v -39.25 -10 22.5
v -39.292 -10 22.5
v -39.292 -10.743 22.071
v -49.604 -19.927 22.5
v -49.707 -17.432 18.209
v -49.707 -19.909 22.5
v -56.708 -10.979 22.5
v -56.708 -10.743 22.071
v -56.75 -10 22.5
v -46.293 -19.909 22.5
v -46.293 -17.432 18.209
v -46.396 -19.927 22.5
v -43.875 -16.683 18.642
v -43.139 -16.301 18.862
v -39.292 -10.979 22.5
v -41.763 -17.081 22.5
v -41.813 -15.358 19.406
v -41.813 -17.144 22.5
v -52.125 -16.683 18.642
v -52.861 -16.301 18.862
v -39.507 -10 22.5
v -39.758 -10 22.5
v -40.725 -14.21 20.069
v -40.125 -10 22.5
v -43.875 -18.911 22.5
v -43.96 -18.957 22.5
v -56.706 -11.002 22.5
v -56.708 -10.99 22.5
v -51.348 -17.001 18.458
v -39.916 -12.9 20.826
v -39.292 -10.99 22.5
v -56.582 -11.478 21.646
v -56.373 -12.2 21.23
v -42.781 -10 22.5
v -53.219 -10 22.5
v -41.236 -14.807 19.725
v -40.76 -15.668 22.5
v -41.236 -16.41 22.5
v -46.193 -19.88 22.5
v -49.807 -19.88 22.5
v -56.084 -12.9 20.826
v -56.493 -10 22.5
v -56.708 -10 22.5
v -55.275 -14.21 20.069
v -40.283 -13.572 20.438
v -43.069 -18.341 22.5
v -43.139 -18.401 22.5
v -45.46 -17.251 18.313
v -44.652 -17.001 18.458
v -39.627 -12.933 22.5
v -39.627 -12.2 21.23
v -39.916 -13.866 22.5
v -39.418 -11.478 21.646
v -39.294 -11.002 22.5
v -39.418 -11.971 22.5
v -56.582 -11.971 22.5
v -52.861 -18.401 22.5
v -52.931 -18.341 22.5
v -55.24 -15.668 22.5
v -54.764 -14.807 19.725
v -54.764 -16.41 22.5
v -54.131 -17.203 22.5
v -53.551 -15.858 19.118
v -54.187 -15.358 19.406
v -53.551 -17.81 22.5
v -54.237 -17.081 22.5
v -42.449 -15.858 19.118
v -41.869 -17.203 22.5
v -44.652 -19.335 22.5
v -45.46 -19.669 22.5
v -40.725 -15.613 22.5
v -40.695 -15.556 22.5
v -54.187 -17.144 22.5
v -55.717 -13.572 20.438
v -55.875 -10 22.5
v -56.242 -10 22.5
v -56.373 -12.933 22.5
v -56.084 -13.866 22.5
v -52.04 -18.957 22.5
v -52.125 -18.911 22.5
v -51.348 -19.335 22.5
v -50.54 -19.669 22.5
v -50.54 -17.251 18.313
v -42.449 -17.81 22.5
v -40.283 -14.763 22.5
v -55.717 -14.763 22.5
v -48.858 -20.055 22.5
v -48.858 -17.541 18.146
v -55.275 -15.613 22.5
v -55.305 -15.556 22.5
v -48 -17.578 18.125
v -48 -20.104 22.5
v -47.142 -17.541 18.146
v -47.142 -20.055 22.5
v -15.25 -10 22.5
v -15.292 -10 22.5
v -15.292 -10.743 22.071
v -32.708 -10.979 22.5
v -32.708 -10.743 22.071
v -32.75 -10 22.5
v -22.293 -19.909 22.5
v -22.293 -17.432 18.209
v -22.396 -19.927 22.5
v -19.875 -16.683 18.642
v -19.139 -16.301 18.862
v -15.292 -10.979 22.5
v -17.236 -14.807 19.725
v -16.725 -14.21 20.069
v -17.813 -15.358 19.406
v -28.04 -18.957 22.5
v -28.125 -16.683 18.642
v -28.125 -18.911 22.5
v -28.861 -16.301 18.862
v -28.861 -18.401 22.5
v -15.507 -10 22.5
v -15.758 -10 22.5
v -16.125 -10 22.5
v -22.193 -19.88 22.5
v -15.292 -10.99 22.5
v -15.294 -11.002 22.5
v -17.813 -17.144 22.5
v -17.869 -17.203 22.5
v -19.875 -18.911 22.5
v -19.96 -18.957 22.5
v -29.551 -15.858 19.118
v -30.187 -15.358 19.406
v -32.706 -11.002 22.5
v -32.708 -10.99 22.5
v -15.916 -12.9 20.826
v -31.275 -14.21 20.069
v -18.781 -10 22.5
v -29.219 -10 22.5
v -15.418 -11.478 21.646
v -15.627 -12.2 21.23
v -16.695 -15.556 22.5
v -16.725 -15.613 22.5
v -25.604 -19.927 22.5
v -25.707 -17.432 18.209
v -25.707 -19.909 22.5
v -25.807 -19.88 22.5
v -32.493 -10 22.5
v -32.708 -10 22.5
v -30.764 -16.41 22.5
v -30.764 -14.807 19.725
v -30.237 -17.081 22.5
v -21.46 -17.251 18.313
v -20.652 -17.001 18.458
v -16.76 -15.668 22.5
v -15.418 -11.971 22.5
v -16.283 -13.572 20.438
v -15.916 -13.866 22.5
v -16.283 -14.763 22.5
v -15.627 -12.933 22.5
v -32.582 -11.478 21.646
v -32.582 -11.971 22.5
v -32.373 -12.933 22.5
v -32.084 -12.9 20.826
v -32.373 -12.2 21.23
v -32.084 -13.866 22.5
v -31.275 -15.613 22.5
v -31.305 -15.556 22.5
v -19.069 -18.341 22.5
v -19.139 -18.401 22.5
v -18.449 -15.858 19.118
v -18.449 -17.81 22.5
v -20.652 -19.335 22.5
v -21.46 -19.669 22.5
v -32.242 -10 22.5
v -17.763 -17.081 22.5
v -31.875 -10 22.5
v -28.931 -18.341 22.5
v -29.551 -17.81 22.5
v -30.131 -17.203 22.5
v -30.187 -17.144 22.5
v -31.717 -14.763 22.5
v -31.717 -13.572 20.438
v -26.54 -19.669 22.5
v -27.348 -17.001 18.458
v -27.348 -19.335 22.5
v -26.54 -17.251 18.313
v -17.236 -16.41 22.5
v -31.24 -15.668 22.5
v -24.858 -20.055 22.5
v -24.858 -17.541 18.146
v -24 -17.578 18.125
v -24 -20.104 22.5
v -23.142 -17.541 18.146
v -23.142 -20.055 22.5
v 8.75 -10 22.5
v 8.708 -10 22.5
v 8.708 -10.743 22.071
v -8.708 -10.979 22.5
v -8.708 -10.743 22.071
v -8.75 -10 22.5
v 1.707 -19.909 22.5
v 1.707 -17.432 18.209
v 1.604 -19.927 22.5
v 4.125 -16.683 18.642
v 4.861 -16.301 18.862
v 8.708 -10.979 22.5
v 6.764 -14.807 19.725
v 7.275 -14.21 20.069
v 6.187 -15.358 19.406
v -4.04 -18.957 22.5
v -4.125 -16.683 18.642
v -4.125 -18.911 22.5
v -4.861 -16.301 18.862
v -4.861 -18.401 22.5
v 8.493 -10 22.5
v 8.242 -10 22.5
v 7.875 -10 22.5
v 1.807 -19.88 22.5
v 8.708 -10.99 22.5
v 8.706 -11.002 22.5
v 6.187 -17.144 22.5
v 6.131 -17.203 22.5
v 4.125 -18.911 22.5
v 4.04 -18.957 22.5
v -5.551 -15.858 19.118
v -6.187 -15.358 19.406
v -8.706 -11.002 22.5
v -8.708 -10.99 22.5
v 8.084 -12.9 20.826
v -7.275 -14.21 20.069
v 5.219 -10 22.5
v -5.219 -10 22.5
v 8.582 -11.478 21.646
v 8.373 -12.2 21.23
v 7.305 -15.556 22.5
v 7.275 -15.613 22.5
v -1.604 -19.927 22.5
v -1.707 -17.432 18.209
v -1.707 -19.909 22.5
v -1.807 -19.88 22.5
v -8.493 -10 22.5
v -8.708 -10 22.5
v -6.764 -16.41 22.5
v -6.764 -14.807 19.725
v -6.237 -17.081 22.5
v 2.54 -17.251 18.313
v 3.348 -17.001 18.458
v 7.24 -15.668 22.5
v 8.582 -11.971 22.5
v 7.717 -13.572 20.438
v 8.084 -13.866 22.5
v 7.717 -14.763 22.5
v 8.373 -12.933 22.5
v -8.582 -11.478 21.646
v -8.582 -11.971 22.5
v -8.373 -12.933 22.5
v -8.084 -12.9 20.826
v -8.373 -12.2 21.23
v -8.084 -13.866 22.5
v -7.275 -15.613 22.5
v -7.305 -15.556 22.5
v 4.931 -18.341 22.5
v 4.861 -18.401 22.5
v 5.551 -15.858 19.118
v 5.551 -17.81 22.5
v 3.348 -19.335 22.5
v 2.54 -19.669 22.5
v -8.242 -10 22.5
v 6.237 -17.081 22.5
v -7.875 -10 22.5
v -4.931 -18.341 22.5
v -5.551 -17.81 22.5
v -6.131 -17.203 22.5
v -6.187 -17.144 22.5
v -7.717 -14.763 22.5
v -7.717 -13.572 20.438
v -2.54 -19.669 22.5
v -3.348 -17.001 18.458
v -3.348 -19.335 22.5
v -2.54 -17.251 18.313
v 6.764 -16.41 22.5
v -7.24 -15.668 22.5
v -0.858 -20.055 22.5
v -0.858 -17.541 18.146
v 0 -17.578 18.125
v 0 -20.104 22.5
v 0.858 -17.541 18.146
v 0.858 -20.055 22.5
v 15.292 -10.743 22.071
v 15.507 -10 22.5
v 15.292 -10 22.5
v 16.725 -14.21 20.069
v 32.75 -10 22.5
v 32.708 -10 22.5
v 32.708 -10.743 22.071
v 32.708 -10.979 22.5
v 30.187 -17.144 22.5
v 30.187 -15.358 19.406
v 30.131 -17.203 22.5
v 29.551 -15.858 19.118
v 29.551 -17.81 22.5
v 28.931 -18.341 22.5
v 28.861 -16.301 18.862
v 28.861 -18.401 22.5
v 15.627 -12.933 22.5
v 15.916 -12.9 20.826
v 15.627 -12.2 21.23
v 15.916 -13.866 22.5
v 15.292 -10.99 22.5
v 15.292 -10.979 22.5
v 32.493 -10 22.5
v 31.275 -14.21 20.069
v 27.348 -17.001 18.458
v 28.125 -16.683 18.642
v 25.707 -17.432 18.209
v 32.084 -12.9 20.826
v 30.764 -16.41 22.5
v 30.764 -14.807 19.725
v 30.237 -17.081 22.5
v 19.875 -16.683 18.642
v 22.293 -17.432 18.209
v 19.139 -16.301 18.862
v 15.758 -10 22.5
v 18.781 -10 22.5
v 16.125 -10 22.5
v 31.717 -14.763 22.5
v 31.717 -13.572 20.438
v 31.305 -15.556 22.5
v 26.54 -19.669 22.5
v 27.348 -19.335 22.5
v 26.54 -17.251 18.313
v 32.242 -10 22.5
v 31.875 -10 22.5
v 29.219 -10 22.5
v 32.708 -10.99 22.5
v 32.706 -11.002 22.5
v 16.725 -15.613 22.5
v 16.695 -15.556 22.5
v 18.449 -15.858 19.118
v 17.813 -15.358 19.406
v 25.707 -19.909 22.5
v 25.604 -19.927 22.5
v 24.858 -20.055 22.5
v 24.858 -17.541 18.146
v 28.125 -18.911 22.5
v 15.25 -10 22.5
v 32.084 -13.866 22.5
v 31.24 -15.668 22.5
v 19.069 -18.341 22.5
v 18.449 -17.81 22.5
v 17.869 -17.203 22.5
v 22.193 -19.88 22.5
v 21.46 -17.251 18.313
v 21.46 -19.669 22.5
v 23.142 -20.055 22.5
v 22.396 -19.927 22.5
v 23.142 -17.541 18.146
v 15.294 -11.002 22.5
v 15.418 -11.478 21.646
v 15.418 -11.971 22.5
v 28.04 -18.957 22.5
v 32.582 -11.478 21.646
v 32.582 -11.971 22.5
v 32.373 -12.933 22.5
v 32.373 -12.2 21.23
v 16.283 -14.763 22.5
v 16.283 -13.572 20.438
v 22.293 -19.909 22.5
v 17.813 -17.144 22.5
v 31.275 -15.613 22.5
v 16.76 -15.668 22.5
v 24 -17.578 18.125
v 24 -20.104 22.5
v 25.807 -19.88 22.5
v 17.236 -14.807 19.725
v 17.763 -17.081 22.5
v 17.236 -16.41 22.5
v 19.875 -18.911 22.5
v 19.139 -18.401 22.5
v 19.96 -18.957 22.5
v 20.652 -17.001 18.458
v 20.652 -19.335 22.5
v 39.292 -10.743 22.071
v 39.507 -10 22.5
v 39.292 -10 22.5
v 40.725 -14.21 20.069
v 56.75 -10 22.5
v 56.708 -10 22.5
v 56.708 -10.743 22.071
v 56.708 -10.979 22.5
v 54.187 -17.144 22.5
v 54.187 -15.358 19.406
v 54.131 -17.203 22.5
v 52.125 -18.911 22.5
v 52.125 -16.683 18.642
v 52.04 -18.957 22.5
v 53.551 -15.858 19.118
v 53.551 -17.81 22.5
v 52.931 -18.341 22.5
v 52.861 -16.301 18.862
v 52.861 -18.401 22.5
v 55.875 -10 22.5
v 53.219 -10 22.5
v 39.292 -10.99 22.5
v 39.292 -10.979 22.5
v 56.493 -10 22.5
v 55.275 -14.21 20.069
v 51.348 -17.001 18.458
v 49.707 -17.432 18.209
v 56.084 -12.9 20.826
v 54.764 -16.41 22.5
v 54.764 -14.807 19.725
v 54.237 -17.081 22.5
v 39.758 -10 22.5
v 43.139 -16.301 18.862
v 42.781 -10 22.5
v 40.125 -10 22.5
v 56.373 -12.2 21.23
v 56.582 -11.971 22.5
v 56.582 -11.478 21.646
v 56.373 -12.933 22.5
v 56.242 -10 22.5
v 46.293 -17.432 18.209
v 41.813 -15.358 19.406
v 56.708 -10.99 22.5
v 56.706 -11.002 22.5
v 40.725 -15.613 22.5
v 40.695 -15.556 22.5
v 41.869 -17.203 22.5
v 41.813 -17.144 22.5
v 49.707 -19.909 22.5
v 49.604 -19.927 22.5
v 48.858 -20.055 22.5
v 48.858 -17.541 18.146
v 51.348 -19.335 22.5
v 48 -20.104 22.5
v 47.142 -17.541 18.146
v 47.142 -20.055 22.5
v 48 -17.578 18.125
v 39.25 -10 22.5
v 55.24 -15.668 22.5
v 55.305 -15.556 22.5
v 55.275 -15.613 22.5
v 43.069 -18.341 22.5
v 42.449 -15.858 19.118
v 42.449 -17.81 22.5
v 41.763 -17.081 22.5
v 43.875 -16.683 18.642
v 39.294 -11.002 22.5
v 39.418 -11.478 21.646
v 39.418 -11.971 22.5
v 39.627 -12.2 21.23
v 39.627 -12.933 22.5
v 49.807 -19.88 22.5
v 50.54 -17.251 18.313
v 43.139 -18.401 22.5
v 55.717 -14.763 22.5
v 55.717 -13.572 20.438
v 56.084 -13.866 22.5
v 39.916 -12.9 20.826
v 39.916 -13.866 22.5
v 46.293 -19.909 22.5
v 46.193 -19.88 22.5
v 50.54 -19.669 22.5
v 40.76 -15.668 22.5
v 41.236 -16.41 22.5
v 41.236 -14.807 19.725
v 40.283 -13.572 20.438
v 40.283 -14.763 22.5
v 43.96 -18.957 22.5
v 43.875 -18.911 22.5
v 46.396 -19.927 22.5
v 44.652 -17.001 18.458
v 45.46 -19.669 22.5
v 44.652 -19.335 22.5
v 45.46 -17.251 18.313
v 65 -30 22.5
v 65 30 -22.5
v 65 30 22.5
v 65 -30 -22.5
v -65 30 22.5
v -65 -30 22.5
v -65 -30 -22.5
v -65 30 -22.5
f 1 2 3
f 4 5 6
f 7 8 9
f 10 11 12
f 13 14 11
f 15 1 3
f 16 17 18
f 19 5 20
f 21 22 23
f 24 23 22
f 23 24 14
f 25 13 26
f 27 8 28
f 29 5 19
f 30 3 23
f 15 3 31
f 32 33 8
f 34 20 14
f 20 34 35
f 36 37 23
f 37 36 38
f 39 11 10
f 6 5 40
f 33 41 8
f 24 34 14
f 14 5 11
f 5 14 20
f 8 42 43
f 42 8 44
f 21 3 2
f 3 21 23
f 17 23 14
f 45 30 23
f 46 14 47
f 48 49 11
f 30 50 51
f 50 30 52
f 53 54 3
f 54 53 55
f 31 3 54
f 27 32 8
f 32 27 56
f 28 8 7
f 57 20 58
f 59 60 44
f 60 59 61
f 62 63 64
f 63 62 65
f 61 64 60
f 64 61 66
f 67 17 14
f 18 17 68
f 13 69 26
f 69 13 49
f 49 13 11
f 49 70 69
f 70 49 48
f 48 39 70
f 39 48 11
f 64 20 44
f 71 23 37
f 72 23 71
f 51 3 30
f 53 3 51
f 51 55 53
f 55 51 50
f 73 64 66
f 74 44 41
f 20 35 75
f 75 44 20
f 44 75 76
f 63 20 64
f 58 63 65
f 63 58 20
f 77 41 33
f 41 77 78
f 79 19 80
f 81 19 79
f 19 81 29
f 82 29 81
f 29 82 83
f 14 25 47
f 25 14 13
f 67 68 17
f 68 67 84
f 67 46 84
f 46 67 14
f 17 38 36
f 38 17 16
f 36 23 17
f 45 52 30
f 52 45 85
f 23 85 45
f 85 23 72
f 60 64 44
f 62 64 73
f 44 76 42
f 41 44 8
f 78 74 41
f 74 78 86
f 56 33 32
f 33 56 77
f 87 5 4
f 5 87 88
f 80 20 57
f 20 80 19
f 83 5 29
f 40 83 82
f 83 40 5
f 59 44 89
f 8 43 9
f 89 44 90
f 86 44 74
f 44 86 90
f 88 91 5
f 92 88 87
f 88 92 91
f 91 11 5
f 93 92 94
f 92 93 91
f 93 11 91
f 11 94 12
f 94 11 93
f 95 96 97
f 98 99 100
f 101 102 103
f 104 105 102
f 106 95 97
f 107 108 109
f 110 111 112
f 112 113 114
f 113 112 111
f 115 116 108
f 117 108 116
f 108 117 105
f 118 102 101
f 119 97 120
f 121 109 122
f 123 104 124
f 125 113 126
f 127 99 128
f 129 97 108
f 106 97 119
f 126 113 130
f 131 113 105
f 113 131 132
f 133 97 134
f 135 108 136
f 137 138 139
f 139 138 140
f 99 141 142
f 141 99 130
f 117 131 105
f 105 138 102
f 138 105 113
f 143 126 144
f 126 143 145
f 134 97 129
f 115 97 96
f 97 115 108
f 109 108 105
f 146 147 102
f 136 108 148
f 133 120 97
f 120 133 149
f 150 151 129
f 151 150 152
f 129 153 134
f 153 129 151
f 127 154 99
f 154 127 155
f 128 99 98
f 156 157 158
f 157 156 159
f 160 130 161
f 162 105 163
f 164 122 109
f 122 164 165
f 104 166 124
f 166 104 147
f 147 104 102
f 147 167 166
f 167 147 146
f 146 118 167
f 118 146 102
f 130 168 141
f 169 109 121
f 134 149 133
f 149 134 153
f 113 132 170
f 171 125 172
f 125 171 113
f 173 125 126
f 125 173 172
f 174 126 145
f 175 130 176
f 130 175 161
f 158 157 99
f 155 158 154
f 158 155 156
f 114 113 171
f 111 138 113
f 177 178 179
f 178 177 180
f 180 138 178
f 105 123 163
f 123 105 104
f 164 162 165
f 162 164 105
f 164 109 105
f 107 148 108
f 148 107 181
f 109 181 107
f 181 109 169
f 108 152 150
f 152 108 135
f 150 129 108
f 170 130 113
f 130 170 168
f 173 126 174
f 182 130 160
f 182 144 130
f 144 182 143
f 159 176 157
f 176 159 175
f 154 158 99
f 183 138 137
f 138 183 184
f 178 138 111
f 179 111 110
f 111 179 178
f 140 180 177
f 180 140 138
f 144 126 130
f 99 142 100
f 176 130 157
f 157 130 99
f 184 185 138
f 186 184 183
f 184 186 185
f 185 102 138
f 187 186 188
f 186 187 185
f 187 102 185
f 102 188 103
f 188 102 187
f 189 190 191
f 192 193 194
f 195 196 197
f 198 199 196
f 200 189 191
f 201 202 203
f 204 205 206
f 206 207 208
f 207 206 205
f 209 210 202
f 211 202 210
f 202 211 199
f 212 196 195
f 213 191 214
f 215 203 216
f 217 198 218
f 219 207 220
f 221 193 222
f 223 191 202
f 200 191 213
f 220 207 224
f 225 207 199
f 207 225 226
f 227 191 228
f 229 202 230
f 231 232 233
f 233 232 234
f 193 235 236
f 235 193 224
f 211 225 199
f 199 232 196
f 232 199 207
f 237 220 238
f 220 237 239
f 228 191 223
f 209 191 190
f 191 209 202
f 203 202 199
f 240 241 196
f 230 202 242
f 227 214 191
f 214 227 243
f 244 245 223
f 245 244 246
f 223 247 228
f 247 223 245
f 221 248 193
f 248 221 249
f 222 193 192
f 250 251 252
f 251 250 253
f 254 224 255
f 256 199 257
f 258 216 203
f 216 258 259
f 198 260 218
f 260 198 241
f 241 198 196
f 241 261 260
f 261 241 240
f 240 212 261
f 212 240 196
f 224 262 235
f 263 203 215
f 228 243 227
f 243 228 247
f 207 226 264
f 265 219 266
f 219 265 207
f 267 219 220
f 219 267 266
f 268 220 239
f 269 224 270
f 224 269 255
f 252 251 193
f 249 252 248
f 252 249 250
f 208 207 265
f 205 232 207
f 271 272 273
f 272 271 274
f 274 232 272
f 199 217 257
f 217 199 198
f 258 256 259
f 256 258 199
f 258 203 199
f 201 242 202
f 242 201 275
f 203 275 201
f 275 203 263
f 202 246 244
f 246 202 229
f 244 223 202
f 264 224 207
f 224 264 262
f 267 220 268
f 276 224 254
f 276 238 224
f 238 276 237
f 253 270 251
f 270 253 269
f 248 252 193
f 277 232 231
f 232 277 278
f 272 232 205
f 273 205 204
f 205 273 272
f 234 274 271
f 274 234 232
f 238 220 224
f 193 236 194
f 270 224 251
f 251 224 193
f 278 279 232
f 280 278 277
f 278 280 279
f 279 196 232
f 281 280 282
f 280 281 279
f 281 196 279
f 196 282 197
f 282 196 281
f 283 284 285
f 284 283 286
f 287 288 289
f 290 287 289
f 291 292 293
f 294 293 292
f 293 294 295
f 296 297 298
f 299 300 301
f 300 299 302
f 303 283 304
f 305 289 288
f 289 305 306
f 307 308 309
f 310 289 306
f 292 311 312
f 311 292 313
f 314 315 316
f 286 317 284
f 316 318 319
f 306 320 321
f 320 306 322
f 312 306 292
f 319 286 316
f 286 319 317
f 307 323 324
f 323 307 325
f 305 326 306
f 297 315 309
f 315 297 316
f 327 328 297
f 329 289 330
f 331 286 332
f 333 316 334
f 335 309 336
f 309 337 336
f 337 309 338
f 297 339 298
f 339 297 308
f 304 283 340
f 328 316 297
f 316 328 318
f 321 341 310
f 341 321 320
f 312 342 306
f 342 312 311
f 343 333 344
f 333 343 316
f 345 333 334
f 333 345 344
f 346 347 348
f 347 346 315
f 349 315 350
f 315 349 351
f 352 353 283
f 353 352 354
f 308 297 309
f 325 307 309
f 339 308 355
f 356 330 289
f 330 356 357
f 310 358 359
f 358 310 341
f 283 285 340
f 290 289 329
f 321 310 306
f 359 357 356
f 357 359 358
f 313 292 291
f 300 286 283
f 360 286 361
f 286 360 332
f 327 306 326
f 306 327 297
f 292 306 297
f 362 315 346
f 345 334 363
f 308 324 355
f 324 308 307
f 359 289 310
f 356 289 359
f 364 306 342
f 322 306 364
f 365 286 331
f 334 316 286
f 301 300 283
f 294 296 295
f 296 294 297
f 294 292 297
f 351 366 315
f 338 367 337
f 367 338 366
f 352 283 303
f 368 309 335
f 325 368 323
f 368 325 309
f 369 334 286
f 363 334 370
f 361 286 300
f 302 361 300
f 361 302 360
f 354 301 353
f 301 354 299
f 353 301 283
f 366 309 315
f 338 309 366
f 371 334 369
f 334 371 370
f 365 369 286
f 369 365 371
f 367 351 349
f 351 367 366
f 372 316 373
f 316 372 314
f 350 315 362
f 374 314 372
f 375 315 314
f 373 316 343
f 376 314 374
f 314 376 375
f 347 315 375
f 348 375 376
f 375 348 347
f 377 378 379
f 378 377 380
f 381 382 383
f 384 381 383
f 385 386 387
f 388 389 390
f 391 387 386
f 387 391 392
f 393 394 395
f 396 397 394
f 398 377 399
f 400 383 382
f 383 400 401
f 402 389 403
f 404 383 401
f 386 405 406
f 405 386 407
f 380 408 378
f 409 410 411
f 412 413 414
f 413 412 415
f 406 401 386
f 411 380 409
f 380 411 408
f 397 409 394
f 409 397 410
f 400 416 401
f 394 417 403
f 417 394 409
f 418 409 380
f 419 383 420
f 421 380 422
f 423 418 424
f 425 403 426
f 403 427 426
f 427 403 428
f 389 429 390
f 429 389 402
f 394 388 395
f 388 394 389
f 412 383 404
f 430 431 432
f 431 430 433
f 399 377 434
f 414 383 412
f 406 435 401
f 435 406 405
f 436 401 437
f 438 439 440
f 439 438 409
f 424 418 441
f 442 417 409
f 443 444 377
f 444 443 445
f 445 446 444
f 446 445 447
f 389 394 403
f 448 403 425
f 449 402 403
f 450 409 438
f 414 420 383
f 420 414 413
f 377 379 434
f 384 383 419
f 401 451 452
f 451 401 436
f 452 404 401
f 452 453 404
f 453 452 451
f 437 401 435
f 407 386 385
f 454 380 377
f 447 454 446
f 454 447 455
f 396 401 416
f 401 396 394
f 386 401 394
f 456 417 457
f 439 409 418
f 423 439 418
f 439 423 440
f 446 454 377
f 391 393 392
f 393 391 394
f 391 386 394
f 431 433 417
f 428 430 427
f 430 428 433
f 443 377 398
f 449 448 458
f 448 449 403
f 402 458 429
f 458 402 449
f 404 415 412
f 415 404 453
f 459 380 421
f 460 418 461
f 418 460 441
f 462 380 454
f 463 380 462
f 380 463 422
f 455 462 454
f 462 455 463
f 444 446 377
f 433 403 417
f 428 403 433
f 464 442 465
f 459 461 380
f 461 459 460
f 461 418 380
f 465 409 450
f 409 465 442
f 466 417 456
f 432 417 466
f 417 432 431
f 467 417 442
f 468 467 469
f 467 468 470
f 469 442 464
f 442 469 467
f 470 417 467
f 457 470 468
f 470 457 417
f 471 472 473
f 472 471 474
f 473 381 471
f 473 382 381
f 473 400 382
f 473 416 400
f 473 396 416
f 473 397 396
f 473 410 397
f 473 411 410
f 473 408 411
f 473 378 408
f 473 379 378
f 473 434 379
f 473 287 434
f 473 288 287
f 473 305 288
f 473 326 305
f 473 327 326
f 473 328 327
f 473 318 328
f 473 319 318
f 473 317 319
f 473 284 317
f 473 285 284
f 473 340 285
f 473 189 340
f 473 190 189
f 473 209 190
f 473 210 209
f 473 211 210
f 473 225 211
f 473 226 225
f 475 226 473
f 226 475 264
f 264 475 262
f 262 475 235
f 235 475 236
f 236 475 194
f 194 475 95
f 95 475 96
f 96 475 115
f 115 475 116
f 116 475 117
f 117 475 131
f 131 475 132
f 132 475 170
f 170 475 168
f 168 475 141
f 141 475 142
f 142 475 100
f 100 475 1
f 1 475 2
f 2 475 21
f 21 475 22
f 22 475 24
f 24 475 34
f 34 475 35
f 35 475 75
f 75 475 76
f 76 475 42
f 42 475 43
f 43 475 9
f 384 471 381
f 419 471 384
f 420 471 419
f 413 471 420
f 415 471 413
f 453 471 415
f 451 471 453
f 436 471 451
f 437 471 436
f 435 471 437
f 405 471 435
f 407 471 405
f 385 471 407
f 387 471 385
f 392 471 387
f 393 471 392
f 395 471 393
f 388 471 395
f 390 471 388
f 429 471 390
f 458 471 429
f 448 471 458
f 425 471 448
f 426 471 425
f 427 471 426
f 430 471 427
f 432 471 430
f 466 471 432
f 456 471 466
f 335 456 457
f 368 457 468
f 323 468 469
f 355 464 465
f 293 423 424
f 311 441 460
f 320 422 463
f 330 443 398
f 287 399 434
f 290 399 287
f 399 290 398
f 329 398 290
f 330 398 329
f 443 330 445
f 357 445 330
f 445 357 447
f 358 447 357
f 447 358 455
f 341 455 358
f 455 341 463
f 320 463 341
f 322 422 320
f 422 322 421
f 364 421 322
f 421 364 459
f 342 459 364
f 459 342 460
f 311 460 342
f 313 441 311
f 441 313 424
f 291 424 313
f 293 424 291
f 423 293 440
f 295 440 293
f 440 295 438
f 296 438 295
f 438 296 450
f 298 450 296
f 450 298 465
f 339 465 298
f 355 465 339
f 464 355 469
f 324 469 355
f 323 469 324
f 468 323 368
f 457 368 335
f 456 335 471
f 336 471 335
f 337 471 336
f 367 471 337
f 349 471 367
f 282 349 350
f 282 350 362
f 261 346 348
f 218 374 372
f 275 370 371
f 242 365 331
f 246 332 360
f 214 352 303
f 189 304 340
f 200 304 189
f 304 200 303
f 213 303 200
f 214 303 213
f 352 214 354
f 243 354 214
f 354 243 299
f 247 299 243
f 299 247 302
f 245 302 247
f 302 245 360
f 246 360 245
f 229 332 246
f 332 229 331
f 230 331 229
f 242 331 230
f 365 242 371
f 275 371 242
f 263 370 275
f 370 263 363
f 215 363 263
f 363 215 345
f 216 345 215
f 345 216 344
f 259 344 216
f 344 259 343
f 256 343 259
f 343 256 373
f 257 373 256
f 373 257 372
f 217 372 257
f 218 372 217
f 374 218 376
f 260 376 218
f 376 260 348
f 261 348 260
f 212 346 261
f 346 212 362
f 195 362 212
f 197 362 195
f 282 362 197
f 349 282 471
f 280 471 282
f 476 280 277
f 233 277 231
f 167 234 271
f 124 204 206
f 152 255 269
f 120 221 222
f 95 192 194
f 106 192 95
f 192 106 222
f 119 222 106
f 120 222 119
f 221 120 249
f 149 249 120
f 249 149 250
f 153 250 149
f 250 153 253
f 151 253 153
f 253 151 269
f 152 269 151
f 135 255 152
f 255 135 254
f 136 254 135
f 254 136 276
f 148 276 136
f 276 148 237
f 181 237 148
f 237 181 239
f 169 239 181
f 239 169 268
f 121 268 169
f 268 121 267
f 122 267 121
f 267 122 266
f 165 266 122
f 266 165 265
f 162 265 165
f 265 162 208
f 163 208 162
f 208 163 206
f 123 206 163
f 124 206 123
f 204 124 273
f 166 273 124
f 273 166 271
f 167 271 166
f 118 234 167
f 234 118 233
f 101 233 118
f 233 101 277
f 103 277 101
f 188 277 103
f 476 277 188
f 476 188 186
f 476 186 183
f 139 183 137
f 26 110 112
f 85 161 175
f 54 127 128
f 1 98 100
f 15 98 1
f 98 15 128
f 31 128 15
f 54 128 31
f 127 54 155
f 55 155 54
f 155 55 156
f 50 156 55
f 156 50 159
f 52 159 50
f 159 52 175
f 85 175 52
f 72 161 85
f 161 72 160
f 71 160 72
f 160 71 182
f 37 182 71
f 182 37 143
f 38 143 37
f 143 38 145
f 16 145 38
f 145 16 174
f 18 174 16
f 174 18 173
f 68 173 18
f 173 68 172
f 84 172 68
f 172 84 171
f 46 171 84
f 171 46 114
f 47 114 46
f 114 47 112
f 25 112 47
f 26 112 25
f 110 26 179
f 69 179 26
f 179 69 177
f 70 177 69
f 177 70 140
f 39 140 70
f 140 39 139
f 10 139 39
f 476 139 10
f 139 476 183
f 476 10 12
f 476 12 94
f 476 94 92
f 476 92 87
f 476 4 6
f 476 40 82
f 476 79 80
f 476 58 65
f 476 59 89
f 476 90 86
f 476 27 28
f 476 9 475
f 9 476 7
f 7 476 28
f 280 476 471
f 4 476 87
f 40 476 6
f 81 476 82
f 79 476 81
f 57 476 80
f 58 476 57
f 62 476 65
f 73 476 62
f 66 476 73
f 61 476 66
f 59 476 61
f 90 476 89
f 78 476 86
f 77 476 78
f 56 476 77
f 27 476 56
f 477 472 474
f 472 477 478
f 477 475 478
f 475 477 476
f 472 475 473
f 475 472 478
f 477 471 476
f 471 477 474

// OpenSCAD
// Dimensions (mm)
block_length_x = 130;
block_depth_y = 60;
block_height_z = 45;

// Hole parameters
hole_diameter = 17.5;
hole_depth = 40;
hole_spacing_x = 24;
num_holes = 5;

// Tilt parameters
tilt_angle = 30; // degrees from vertical
top_face_y_offset = -10; // Y position on top face where axis intersects

// Rendering quality
$fn = 64;

// Main block centered at origin, resting on z=0
// Block spans X: -65 to 65, Y: -30 to 30, Z: 0 to 45
difference() {
    // Solid block
    translate([0, 0, 0])
    cube([block_length_x, block_depth_y, block_height_z], center = true);
    
    // Holes
    for (i = [-(num_holes-1)/2 : (num_holes-1)/2]) {
        x_pos = i * hole_spacing_x;
        
        // The axis intersects the top face at (x_pos, top_face_y_offset, block_height_z/2)
        // Top face is at z = block_height_z/2 = 22.5
        top_center = [x_pos, top_face_y_offset, block_height_z/2];
        
        // The hole is tilted 30 degrees from vertical in the YZ plane, moving toward +Y as it goes down
        // We create a cylinder along the Z axis, then rotate it around the X axis by tilt_angle
        // This tilts the cylinder toward +Y
        
        // The cylinder needs to extend past the block to ensure clean cutting
        // Depth is 40mm along the axis, so we make it slightly longer (41mm)
        // We also need to ensure it extends past the bottom of the block in Z
        
        translate(top_center)
        rotate([tilt_angle, 0, 0])
        cylinder(r = hole_diameter/2, h = hole_depth + 1, center = false);
    }
}
